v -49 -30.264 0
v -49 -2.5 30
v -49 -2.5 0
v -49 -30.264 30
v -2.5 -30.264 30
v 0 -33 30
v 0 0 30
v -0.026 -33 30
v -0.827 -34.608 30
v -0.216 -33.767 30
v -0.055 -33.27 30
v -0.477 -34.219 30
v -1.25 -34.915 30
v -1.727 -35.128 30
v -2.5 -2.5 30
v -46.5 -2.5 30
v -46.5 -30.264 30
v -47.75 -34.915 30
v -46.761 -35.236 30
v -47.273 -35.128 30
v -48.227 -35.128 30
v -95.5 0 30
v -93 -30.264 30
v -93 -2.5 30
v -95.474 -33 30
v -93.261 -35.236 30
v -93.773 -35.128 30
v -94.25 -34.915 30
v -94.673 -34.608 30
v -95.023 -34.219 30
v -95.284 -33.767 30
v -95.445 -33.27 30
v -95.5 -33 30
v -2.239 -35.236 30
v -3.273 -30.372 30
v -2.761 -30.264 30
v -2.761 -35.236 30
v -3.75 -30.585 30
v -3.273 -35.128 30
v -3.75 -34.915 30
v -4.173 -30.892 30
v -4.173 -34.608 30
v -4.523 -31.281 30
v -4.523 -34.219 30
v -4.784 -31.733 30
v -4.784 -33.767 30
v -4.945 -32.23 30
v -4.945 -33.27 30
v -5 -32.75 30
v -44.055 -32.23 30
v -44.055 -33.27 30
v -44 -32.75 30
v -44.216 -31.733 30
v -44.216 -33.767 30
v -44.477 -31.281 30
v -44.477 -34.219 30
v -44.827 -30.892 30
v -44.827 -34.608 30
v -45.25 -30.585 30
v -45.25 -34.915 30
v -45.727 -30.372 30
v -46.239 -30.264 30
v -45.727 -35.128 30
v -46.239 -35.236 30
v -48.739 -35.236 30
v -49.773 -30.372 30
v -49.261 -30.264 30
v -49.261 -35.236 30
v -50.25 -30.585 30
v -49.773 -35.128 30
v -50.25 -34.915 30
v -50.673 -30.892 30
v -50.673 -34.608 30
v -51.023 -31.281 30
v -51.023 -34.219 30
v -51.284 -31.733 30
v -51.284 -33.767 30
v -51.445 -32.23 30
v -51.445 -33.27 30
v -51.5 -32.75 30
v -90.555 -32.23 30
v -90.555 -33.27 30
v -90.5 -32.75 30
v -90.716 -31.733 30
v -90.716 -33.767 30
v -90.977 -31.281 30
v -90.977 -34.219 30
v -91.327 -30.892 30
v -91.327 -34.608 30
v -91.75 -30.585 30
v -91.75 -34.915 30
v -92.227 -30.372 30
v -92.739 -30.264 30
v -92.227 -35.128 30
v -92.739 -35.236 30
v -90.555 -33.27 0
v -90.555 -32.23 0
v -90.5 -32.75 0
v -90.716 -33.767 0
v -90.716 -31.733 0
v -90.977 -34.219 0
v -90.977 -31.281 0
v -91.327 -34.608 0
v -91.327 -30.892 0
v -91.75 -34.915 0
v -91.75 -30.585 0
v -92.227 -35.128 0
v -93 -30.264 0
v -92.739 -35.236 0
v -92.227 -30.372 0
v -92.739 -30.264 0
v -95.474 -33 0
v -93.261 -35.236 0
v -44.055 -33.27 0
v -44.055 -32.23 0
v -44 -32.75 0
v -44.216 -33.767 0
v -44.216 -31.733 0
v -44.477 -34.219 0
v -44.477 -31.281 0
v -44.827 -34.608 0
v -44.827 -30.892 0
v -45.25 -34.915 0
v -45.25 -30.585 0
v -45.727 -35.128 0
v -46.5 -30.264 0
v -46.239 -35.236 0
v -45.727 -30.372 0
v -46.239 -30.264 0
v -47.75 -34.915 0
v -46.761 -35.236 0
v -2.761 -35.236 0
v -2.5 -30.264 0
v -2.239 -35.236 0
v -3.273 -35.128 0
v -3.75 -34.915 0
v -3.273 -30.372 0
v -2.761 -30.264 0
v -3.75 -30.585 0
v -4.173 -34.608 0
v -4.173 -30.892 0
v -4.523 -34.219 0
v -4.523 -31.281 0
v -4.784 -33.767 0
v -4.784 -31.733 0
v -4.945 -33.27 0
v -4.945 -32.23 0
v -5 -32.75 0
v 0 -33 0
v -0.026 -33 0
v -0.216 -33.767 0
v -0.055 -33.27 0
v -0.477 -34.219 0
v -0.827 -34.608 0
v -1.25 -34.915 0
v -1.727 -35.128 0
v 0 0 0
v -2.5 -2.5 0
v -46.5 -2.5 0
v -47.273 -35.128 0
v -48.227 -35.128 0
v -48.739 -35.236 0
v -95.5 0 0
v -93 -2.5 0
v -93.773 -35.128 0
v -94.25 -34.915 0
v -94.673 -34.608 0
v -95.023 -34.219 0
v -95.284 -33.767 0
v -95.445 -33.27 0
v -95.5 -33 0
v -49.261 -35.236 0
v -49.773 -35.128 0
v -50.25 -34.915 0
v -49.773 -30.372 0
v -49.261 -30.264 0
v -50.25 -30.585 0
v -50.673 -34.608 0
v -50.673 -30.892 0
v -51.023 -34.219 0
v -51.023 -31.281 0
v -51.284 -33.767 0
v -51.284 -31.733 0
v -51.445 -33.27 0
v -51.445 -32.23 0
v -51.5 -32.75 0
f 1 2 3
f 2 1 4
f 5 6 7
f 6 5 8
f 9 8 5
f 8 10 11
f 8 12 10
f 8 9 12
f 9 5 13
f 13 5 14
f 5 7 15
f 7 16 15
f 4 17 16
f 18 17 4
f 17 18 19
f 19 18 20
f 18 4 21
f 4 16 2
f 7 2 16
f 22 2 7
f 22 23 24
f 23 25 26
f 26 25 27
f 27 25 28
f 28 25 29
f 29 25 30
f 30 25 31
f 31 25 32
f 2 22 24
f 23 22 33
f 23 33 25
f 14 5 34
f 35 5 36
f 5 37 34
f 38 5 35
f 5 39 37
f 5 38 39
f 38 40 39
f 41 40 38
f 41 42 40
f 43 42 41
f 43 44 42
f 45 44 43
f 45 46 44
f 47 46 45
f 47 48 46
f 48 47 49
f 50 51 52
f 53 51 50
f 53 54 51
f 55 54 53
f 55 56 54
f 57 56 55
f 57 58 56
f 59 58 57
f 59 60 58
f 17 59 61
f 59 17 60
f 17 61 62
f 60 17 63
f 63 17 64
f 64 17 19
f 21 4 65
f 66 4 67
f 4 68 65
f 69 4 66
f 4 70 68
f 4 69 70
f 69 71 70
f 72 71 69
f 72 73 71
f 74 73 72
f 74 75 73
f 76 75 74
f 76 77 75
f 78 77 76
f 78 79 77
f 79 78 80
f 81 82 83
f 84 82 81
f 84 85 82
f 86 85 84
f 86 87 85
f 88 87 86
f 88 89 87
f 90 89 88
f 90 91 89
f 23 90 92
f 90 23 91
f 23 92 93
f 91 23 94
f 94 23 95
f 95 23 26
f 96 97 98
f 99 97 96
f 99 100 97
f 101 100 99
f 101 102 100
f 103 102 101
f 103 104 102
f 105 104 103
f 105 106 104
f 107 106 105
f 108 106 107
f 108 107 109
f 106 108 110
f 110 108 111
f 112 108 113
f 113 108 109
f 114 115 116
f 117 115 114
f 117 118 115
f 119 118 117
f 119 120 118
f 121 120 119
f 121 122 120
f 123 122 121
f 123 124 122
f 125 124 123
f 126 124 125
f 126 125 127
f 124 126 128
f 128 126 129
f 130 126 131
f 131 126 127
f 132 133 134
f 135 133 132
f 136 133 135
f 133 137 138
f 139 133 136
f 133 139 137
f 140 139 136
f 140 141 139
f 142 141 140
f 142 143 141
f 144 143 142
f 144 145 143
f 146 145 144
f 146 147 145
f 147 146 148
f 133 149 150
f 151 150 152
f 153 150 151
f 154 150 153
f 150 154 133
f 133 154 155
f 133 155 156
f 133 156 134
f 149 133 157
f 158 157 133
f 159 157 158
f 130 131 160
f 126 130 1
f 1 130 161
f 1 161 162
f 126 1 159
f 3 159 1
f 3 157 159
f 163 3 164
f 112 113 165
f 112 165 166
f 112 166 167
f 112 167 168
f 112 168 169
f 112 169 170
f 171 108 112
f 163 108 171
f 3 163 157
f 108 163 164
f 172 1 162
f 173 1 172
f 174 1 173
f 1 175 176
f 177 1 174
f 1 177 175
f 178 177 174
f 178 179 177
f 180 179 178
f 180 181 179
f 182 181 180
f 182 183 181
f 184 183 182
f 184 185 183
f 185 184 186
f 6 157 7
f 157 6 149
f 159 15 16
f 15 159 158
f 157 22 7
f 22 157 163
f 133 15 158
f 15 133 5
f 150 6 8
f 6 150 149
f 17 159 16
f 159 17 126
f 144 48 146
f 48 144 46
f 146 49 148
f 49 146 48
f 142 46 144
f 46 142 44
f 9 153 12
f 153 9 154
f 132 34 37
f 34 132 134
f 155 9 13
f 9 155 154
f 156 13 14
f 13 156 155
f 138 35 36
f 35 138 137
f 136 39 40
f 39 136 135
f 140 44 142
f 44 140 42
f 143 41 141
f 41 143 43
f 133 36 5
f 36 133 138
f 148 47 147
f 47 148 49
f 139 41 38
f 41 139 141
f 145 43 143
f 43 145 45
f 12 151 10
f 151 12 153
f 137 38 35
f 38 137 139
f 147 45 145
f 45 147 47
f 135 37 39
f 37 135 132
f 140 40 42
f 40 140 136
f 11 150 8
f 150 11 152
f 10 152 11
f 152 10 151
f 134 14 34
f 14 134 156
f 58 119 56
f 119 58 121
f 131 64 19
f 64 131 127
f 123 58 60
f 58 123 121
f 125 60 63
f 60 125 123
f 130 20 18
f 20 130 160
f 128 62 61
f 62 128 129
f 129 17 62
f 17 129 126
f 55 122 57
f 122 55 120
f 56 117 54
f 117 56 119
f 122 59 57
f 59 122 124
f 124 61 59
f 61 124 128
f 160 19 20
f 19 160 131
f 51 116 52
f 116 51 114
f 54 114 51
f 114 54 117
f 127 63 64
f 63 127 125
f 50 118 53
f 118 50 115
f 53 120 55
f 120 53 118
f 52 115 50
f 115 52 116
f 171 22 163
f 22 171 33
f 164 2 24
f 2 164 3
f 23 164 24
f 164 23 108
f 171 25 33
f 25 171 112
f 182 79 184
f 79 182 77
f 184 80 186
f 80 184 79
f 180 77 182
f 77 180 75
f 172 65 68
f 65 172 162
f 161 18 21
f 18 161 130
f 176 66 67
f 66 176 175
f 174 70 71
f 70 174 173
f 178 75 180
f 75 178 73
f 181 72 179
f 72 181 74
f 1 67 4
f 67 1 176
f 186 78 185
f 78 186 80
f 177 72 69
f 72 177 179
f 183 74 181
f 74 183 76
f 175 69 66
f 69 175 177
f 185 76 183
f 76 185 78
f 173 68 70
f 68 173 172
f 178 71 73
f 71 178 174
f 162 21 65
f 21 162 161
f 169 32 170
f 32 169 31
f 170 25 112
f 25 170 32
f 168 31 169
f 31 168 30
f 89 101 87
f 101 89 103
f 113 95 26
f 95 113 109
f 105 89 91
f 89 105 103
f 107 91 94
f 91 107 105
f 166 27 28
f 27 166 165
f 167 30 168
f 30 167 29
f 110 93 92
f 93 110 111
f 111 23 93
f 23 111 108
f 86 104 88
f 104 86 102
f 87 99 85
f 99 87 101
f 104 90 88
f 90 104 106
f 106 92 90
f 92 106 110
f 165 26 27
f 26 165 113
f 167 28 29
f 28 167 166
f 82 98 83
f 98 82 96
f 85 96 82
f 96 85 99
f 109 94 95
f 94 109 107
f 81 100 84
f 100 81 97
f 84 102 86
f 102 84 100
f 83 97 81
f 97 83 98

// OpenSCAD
// [FL_INDEX: keywords="openscad, 3d_parametric, Customizable_Cargo_strap_clip, csg_solid" | COT="Parametric OpenSCAD design from 3DCodeverse"]
// Title: Customizable Cargo strap clip 

// strap clip.scad

/* [Global] */
// How many in a row
clips=2; // [1,2,3,4,5,6,7,8]

// Mirror clips on the other side
mirror="no"; // [no,yes]

/* [Strap Size] */
// Width of the strap
strap_width=28; // 

// Width once it is rolled up
roll_width=44; // 

/* [Clip Parameters] */
// Size of knob holding the strap in
clip_overhang=2.5;

// Thickness of the holder
clip_thickness=2.5;

// Width of the holder
clip_width=30;



/* [Hidden] */

$fs=0.1;

clipHangRadius=clip_thickness/2+clip_overhang/2;

/*             X
 *      <---roll_width-->
 *     |=================|  <--clip_thickness
 *     |                 | 
 *   Y |                 |   ^
 *     |__             __|   v strap_width
 * 
 *     ^               <> ---clip_overhang
 *      \-clip_thickness
 * 
 */

module clip() {
	*translate([roll_width,clip_thickness,0])
	cube([clip_thickness,strap_width,clip_width]);
	cube([roll_width+2*clip_thickness,clip_thickness,clip_width]);
	cube([clip_thickness,strap_width+clip_thickness*2,clip_width]);
	translate([roll_width+clip_thickness,0,0])
		cube([clip_thickness,strap_width+clip_thickness*2,clip_width]);
	translate([clipHangRadius,strap_width+clip_thickness*1.9,0])
		cylinder(r=clipHangRadius,h=clip_width);
	translate([roll_width+2*clip_thickness-clipHangRadius,strap_width+clip_thickness*1.9,0])
		cylinder(r=clipHangRadius,h=clip_width);
}

rotate([0,0,180]) {
	for (i = [0 : clips-1])
	{
	translate([i*(clip_thickness+roll_width),0,0])
	clip();
	if (mirror=="yes")
		translate([i*(clip_thickness+roll_width),clip_thickness/2,0])
			mirror([0,1,0])
				clip();
	}
}
